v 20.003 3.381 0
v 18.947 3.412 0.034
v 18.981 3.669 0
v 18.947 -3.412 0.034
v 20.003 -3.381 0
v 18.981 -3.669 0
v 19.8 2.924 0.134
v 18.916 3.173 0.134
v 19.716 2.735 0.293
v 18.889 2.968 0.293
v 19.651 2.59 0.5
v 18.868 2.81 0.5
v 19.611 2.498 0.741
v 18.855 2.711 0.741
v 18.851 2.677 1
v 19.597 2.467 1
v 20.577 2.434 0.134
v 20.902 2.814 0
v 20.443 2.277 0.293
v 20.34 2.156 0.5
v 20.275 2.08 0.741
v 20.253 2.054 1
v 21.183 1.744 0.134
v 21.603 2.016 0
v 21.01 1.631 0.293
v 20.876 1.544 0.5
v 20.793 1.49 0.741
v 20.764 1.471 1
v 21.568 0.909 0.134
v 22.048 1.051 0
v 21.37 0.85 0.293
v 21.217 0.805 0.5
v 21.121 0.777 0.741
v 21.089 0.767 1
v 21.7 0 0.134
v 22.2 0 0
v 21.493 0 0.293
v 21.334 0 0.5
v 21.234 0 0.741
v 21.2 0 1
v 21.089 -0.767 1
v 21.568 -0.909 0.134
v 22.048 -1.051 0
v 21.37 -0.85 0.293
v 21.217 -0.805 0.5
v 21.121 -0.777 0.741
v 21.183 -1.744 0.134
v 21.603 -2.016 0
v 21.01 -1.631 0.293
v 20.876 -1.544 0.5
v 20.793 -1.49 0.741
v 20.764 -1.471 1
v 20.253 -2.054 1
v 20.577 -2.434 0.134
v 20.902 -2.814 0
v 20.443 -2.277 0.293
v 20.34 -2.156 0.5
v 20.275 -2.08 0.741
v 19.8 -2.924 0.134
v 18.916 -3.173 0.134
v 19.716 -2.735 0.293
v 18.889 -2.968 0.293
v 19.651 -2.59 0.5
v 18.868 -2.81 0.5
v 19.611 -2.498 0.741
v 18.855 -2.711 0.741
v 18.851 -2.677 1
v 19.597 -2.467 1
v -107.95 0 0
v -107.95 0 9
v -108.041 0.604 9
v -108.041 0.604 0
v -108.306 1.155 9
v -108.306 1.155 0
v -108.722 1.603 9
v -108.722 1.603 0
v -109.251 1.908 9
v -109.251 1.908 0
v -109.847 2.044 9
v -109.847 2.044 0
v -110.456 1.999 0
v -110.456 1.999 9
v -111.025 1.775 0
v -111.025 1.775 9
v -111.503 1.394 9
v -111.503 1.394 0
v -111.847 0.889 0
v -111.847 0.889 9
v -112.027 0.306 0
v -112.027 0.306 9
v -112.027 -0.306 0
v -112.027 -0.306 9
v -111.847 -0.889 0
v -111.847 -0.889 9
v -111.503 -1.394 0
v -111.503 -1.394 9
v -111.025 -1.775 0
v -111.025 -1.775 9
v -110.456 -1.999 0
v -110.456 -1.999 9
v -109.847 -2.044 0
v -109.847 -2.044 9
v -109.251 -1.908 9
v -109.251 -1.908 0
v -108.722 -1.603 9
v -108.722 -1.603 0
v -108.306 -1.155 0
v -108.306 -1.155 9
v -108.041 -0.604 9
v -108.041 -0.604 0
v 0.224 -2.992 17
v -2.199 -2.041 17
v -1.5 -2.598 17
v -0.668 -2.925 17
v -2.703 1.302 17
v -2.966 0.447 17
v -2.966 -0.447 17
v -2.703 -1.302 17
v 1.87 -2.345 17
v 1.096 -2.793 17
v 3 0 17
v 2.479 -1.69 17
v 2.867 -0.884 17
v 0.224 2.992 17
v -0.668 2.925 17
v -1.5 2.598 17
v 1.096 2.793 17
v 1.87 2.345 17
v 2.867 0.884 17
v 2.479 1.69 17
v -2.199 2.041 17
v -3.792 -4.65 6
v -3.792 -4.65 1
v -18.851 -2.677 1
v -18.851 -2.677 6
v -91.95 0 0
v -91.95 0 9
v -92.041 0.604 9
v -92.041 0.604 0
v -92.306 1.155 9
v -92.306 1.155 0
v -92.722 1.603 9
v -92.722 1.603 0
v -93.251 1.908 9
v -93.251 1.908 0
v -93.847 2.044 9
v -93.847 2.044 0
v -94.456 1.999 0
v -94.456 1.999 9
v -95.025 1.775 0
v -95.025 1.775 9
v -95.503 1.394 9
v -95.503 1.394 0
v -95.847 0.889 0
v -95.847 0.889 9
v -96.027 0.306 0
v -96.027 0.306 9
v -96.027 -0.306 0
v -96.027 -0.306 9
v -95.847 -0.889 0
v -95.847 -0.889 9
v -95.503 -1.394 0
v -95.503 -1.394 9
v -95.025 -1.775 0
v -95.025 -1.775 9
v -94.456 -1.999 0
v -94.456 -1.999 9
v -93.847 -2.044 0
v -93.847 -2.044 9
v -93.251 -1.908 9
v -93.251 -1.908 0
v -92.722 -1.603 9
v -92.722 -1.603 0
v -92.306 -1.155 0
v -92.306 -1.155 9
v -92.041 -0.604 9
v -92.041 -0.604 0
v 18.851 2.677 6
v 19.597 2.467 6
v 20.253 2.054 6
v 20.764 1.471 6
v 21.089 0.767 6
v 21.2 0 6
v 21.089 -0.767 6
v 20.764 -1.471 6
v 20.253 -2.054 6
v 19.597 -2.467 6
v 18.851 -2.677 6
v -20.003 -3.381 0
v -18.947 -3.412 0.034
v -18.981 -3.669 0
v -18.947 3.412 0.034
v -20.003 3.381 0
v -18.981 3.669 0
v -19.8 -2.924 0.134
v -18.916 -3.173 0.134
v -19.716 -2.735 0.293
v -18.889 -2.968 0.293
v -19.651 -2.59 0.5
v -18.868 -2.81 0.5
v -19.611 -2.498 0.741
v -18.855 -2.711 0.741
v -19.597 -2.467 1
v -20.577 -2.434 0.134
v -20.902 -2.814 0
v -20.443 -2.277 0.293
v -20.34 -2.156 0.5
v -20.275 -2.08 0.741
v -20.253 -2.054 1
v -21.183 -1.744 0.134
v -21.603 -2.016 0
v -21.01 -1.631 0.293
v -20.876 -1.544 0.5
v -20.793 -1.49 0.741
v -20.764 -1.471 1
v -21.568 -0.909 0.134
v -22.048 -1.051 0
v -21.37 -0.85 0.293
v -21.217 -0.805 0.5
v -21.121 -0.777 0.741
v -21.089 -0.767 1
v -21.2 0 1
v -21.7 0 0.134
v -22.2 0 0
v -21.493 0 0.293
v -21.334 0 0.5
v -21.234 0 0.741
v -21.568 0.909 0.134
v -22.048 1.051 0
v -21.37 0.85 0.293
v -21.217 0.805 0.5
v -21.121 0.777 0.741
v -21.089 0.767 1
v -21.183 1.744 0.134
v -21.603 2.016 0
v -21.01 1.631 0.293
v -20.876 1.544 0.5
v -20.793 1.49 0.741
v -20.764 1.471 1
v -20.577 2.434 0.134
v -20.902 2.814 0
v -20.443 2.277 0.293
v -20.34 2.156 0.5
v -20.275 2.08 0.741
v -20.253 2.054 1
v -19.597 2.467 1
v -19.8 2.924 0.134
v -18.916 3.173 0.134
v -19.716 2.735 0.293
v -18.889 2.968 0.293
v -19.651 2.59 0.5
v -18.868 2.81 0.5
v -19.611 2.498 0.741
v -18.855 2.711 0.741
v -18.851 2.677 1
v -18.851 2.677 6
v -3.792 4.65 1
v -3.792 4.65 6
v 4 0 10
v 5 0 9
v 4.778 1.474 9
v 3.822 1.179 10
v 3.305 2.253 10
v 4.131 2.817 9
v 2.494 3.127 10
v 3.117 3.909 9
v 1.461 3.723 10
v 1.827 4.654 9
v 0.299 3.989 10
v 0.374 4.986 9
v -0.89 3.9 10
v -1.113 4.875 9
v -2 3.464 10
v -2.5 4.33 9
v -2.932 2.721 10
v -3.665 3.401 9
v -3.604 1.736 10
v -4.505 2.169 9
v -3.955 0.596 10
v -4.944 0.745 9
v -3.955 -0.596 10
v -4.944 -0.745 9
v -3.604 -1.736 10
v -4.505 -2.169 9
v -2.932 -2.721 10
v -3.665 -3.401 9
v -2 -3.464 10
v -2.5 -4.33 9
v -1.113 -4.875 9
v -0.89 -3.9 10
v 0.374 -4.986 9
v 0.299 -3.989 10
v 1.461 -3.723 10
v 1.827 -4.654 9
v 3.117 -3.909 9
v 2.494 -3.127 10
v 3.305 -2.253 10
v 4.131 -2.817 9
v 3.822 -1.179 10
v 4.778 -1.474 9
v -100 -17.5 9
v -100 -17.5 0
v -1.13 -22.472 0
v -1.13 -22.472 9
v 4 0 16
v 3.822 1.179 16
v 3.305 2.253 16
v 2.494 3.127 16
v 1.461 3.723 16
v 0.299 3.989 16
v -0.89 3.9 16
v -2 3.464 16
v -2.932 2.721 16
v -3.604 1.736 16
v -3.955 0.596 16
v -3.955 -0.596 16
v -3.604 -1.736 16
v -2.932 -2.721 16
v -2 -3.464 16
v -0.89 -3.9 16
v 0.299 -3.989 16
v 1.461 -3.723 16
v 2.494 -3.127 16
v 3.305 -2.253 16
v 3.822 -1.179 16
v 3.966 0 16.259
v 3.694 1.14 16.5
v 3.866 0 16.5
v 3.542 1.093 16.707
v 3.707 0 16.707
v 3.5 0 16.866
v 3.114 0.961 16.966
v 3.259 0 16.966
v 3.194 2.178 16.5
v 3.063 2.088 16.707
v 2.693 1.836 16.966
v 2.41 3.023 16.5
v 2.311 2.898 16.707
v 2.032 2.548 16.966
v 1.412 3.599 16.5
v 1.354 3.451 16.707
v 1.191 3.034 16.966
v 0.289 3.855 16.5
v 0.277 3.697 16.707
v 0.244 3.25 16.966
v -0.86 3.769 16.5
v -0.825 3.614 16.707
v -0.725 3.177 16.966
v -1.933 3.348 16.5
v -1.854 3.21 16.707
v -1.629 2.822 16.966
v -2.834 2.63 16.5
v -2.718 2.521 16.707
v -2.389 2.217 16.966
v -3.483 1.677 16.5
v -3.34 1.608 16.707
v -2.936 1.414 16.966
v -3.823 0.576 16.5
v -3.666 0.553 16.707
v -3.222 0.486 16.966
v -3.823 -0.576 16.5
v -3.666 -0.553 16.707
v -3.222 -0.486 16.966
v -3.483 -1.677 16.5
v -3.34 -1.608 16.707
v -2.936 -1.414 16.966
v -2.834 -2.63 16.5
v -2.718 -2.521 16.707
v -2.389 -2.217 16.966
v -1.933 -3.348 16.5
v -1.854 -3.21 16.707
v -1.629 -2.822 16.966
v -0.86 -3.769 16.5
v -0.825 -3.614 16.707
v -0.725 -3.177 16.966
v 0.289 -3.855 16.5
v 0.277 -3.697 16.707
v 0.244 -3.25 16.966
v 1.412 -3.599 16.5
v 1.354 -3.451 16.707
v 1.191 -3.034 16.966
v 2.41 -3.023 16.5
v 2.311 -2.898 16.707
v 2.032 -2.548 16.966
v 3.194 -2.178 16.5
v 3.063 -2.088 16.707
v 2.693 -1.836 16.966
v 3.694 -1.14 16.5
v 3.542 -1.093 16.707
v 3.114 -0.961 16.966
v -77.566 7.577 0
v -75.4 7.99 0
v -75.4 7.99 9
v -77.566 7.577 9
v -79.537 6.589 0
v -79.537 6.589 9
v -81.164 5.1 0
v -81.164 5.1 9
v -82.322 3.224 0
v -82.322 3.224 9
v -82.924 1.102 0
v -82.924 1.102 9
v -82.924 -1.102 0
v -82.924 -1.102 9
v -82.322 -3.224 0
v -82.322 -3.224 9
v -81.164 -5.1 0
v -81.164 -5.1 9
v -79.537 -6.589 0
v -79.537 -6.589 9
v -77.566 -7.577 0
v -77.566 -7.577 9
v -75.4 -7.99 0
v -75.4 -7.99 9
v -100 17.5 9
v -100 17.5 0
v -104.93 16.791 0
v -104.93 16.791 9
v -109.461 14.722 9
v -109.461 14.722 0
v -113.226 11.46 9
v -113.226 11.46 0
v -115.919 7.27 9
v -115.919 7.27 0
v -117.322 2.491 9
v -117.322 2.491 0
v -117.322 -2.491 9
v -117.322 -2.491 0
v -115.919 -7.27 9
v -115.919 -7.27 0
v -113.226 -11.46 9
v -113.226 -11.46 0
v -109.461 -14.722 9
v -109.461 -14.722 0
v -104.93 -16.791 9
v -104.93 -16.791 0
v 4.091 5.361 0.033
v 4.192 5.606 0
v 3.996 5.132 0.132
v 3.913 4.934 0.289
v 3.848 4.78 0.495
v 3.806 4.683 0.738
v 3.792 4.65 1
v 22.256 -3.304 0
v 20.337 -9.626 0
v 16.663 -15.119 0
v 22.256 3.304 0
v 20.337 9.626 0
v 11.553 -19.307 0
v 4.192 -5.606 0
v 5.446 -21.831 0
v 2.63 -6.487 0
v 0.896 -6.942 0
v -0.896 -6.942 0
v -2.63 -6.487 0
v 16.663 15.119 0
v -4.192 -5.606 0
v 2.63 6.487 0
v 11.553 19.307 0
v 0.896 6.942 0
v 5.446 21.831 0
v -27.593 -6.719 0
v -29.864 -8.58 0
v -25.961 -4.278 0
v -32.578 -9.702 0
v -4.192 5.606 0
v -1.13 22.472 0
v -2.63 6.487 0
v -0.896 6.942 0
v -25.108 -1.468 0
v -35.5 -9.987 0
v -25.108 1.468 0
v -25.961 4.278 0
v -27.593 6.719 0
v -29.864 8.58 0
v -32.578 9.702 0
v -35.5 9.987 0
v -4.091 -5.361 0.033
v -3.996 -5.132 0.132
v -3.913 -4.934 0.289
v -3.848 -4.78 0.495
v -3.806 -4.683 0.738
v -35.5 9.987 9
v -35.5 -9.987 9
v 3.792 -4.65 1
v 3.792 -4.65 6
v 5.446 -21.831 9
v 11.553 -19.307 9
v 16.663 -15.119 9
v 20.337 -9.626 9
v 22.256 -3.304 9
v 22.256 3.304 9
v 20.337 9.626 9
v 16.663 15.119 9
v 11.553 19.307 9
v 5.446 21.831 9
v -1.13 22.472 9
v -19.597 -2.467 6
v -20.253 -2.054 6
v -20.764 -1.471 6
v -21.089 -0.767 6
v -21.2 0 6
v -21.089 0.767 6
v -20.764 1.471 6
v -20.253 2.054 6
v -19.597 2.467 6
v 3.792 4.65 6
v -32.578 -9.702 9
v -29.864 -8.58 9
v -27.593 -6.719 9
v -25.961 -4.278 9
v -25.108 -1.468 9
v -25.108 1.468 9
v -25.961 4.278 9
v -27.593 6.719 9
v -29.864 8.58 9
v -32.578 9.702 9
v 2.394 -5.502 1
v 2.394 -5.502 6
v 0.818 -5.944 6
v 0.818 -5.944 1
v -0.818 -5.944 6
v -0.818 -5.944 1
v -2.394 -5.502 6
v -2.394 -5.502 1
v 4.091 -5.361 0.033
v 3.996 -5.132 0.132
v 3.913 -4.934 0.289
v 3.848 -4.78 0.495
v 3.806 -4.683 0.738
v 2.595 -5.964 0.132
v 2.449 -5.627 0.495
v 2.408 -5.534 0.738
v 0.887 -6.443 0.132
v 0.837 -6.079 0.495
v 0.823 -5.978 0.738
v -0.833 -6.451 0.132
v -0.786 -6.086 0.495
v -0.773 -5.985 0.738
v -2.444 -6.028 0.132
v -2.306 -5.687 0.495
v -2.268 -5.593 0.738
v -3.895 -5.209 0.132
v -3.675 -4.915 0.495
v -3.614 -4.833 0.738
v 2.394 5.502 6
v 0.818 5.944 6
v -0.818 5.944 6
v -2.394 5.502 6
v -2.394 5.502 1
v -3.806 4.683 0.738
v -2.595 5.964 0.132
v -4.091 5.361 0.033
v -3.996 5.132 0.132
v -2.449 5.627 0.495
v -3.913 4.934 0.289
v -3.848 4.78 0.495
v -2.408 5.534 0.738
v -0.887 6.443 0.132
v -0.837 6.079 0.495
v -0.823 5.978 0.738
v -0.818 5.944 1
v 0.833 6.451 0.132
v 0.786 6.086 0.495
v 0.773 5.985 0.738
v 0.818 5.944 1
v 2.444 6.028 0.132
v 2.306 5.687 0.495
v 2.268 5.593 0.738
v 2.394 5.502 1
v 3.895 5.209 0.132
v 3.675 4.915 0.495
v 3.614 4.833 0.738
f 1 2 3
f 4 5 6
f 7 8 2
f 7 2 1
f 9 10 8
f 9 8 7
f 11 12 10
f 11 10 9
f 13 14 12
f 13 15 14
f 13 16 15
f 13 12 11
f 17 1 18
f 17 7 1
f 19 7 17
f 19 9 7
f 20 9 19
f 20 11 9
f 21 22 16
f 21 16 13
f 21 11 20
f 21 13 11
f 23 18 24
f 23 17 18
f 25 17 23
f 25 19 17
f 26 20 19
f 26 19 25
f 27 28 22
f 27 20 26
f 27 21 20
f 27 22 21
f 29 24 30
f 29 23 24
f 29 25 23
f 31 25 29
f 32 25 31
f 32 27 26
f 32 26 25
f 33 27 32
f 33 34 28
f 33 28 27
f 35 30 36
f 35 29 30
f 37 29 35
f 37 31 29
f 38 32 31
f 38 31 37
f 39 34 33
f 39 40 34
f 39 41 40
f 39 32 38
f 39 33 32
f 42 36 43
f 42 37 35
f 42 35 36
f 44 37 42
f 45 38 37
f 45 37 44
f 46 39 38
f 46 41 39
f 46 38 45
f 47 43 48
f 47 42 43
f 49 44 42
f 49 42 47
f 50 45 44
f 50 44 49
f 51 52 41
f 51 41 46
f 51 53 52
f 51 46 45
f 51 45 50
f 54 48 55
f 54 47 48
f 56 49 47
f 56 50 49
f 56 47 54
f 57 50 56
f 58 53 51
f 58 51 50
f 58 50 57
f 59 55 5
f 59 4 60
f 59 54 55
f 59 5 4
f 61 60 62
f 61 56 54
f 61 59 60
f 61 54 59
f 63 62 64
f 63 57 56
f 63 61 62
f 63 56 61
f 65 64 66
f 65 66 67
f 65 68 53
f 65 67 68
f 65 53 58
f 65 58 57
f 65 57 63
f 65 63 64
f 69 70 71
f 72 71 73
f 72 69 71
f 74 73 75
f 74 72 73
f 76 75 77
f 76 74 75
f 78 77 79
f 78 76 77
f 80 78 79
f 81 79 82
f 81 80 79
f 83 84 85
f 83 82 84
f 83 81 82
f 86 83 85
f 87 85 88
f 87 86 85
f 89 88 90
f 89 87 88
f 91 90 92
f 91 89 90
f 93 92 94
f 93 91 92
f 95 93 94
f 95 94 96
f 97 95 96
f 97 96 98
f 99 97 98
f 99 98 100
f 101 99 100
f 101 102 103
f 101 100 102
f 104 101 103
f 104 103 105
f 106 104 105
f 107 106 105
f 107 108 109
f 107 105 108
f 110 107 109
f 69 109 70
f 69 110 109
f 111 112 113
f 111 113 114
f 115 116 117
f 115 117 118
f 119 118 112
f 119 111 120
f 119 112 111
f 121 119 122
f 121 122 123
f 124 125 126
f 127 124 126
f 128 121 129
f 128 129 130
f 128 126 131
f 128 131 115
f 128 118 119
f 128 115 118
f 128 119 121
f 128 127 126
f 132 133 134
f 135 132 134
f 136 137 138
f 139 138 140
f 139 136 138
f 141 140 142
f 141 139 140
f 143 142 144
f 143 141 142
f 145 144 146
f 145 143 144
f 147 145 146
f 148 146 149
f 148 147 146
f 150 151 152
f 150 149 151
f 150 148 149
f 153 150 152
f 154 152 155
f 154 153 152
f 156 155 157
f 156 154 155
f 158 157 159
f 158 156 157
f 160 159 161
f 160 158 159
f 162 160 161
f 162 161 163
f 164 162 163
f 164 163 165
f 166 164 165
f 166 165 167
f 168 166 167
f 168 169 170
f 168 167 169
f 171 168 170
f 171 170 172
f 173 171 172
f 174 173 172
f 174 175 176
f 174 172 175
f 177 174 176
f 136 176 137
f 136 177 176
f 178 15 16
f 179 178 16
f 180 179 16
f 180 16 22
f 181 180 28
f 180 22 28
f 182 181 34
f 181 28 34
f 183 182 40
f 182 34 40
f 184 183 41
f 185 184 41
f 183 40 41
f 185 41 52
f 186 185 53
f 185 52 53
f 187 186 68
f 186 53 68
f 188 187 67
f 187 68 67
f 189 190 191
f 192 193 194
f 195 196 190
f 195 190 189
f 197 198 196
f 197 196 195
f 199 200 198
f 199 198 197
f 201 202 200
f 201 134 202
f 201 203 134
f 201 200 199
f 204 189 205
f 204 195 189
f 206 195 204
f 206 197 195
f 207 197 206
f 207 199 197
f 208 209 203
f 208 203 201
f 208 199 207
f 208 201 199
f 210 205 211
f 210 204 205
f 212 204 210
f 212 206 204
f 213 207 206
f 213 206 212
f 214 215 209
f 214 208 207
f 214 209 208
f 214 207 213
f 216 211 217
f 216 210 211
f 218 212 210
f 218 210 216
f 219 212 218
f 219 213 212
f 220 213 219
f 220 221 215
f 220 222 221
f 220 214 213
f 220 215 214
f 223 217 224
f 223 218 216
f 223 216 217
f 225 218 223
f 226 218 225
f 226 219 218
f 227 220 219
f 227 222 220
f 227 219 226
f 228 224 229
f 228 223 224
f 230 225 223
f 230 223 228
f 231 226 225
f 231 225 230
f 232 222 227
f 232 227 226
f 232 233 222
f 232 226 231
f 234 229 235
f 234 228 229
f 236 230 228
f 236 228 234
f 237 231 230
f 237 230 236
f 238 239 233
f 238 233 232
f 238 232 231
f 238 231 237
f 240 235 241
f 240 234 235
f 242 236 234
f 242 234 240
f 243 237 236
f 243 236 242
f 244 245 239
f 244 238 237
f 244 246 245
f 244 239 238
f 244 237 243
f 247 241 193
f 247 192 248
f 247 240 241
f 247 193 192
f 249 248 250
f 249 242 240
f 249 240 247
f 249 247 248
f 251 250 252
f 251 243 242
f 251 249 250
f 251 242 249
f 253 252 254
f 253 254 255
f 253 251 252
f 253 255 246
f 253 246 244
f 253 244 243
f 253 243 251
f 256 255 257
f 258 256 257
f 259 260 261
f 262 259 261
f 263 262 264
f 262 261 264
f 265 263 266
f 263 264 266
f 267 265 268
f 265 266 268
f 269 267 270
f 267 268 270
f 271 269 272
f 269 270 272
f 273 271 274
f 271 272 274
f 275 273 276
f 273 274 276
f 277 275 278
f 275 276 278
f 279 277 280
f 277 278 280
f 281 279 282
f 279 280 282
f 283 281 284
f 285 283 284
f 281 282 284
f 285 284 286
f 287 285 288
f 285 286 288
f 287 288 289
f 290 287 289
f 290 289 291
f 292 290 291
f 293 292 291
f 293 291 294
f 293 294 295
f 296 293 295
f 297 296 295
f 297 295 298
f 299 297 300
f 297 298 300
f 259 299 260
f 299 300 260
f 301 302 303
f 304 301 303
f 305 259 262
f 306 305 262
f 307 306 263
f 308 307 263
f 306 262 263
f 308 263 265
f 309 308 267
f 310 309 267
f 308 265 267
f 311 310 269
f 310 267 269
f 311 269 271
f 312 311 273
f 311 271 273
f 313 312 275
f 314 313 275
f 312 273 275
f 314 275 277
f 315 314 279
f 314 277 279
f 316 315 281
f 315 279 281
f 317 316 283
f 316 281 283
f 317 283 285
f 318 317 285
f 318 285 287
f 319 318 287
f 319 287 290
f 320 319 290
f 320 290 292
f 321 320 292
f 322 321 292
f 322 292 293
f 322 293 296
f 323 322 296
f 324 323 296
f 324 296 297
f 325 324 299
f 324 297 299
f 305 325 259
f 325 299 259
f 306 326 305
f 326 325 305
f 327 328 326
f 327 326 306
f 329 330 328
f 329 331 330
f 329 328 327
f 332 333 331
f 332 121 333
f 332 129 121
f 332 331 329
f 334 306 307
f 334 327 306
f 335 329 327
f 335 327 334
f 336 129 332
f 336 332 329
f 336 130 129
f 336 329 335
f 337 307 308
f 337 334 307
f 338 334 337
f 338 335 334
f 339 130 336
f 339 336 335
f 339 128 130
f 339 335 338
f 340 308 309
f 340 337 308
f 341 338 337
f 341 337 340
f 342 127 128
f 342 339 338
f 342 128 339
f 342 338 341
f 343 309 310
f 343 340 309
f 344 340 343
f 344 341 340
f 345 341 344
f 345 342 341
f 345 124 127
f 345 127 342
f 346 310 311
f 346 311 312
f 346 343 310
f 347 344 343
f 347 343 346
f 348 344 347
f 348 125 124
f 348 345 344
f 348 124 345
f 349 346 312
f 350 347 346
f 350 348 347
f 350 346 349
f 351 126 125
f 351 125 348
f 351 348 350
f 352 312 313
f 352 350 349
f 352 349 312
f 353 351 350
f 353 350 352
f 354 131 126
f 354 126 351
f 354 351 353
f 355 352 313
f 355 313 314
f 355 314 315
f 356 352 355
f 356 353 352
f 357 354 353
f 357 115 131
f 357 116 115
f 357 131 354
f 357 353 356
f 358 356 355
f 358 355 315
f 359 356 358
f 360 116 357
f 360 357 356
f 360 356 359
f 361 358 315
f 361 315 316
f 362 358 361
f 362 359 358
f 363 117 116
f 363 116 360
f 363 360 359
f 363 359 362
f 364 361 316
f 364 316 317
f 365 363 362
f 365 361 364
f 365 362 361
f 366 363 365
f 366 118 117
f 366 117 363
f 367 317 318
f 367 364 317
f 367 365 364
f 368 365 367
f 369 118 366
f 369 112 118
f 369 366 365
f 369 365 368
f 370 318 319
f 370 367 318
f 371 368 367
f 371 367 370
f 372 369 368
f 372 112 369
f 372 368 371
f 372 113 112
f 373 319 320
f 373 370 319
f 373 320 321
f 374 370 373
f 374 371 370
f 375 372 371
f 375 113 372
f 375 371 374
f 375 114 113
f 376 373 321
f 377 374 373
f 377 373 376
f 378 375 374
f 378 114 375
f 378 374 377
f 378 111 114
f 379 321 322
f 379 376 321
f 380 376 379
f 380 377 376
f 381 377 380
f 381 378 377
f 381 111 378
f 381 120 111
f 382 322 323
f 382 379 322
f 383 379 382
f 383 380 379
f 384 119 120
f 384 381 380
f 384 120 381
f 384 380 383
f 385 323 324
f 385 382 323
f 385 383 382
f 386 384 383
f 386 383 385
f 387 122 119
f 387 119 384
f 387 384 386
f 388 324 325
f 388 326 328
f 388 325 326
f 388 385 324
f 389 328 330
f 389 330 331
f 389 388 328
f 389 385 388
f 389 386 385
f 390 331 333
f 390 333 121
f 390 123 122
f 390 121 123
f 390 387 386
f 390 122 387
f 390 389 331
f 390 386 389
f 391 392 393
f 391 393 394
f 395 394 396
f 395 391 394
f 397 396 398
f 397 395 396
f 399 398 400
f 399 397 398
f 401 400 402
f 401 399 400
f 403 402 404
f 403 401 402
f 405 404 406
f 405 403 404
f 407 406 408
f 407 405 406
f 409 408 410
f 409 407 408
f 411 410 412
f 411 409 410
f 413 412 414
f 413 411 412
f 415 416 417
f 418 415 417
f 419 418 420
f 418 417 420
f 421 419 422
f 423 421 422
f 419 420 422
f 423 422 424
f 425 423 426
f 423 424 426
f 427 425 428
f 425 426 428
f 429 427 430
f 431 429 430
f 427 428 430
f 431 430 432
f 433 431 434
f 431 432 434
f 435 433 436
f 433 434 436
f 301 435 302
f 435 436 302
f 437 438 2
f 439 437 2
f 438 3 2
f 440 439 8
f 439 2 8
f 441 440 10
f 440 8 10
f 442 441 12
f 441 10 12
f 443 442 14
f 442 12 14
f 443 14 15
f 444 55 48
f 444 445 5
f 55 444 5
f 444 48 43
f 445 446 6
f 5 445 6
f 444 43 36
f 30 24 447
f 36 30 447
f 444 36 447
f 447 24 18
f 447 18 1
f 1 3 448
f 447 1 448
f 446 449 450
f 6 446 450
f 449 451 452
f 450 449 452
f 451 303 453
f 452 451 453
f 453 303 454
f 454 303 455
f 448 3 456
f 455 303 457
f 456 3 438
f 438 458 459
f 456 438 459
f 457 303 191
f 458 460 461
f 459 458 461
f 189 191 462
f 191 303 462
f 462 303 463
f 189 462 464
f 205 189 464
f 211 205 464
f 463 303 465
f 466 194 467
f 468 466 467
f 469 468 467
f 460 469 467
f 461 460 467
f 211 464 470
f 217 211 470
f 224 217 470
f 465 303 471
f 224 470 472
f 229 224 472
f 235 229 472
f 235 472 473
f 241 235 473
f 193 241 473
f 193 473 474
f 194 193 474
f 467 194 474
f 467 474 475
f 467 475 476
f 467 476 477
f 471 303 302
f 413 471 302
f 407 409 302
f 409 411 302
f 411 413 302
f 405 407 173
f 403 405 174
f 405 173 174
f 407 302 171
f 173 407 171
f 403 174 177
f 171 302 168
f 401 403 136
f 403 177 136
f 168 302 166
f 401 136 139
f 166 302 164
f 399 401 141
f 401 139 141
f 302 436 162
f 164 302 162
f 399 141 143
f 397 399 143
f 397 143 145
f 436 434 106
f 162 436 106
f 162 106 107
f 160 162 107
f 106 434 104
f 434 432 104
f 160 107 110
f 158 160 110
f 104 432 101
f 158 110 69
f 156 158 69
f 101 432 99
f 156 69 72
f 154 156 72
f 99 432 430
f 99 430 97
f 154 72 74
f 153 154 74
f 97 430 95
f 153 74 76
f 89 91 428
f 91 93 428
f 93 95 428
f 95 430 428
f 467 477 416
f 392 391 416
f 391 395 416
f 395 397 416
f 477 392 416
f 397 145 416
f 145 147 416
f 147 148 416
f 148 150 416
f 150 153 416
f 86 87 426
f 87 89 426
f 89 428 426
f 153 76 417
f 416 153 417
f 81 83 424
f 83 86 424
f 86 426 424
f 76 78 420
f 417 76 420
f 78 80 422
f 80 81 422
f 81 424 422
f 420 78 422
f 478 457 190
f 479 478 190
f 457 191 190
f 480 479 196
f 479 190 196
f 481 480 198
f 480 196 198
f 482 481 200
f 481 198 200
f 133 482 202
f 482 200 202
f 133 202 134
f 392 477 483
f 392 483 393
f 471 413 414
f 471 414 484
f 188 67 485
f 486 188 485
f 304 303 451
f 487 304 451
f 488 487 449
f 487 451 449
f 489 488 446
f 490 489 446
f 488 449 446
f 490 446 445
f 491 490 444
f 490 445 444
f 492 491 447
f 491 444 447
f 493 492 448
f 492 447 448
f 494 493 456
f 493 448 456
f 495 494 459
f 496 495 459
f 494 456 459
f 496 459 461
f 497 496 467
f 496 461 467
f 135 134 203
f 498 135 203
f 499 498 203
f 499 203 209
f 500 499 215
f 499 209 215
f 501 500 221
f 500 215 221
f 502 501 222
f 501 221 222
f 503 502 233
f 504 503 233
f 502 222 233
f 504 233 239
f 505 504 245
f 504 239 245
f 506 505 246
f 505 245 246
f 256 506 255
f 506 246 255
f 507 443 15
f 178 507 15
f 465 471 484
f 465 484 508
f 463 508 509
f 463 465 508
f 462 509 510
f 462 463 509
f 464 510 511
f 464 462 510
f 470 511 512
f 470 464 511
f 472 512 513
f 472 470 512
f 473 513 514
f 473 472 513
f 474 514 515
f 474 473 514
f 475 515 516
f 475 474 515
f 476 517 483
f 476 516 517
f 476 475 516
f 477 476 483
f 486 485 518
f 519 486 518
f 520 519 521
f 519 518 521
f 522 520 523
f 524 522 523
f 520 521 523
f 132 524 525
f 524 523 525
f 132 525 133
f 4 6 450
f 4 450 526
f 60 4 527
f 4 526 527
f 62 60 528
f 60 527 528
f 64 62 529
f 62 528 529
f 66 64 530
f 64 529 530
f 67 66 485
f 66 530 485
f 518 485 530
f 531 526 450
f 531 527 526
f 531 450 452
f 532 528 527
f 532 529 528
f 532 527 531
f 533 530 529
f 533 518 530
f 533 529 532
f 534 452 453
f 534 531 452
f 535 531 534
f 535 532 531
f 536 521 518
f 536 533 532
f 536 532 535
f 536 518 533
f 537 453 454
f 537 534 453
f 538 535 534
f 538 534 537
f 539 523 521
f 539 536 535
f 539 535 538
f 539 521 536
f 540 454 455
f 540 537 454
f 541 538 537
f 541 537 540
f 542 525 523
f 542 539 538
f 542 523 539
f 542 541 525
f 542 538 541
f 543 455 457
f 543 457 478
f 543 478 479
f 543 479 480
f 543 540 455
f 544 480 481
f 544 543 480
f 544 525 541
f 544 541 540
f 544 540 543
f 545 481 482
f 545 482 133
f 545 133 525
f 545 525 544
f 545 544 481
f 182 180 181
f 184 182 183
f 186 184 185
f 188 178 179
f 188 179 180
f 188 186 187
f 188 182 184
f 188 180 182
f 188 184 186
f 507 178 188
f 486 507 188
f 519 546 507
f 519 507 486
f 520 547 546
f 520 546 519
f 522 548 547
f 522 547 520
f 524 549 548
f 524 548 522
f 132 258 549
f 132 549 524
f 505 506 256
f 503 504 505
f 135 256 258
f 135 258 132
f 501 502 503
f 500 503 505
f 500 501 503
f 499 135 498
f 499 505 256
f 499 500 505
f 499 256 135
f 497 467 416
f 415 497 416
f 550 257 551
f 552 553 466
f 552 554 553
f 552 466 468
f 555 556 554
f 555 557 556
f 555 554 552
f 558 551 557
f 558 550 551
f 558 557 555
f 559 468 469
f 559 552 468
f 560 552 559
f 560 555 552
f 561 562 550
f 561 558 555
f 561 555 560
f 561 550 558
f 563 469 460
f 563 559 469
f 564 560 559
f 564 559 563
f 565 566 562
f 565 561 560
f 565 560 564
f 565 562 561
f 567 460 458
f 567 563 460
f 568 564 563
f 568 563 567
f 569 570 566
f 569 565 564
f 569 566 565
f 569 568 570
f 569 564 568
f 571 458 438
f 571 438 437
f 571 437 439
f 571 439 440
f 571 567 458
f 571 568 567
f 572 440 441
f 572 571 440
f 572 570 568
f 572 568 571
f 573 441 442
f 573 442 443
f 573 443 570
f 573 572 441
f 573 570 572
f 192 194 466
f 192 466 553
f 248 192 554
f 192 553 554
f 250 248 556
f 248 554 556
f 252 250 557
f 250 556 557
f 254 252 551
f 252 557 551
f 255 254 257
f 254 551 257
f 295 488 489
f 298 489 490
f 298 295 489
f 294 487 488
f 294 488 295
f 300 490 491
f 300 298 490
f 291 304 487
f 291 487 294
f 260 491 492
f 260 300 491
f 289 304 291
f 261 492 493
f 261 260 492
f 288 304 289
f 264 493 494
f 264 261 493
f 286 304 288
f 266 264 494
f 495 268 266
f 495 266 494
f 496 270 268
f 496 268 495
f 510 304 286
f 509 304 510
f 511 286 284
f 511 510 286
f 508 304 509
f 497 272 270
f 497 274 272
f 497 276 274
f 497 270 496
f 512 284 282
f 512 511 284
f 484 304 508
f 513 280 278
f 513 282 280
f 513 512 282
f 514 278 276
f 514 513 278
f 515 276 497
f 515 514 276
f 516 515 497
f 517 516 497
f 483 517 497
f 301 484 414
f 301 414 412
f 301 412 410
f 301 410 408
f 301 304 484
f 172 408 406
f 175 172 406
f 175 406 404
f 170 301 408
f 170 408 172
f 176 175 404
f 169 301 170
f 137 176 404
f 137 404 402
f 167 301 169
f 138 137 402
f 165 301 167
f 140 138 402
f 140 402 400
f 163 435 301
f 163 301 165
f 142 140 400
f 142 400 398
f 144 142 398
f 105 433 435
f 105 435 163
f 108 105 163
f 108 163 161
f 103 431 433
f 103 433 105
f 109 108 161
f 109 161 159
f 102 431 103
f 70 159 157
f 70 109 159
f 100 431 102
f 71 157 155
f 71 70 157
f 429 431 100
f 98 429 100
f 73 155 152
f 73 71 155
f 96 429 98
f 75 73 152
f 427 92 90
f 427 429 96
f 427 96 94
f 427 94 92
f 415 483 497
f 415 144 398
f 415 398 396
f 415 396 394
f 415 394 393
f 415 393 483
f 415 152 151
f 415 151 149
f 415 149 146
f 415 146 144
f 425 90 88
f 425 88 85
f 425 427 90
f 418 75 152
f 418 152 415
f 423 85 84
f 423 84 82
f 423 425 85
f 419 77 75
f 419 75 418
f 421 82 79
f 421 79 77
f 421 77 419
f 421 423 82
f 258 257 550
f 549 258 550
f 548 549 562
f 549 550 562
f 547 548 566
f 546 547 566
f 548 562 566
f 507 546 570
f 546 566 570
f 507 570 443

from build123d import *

# Parameters (mm, degrees)
BOSS_EXTRUDE1_DEPTH = 9
BOSS_EXTRUDE2_START = 9
SKETCH3_R           = 4
BOSS_EXTRUDE2_DEPTH = 8
FILLET1_R           = 1
CHAMFER2_SIZE       = 1
CUT_EXTRUDE1_DEPTH  = 6
FILLET3_R           = 1
SKETCH6_R           = 2.05
CUT_EXTRUDE2_DEPTH  = 10


with BuildPart() as part:
    # Sketch2 → Boss-Extrude1 (new body)
    with BuildSketch(Plane(origin=(0, 0, 0), x_dir=(0, 1, 0), z_dir=(0, 0, 1))):
        with BuildLine():
            Line((22.471608109, 1.129968581), (17.5, 100))
            ThreePointArc((17.5, 100), (0, 117.5), (-17.5, 100))
            Line((-17.5, 100), (-22.471608109, 1.129968581))
            ThreePointArc((-22.471608109, 1.129968581), (0, -22.5), (22.471608109, 1.129968581))
        make_face()
    extrude(amount=BOSS_EXTRUDE1_DEPTH)

    # Sketch3 → Boss-Extrude2 (add)
    with BuildSketch(Plane(origin=(0, 0, 0), x_dir=(0, 1, 0), z_dir=(0, 0, 1)).offset(BOSS_EXTRUDE2_START)):
        with Locations(Location((0, 0, 0), (0, 0, 270))):
            Circle(SKETCH3_R)
    extrude(amount=BOSS_EXTRUDE2_DEPTH)

    # Fillet1
    fillet1_edges = [part.edges().sort_by_distance(p)[0] for p in [
        (-4, 0, 17),
    ]]
    fillet(fillet1_edges, radius=FILLET1_R)

    # Chamfer2
    chamfer2_edges = [part.edges().sort_by_distance(p)[0] for p in [
        (-4, 0, 9),
    ]]
    chamfer(chamfer2_edges, length=CHAMFER2_SIZE)

    # Sketch5 → Cut-Extrude1 (cut)
    with BuildSketch(Plane(origin=(0, 0, 0), x_dir=(0, 1, 0), z_dir=(0, 0, 1))):
        with BuildLine():
            Line((-2.677123133, -18.850730282), (-4.65, -3.791767398))
            ThreePointArc((-4.65, -3.791767398), (-6, 0), (-4.65, 3.791767398))
            Line((-4.65, 3.791767398), (-2.677123133, 18.850730282))
            ThreePointArc((-2.677123133, 18.850730282), (0, 21.2), (2.677123133, 18.850730282))
            Line((2.677123133, 18.850730282), (4.65, 3.791767398))
            ThreePointArc((4.65, 3.791767398), (6, 0), (4.65, -3.791767398))
            Line((4.65, -3.791767398), (2.677123133, -18.850730282))
            ThreePointArc((2.677123133, -18.850730282), (0, -21.2), (-2.677123133, -18.850730282))
        make_face()
    extrude(amount=CUT_EXTRUDE1_DEPTH, mode=Mode.SUBTRACT)

    # Fillet3
    fillet3_edges = [part.edges().sort_by_distance(p)[0] for p in [
        (-21.2, 0, 0),
        (0, -6, 0),
        (21.2, 0, 0),
        (0, 6, 0),
        (-11.32124884, 3.663561567, 0),
        (11.32124884, 3.663561567, 0),
        (11.32124884, -3.663561567, 0),
        (-11.32124884, -3.663561567, 0),
    ]]
    fillet(fillet3_edges, radius=FILLET3_R)

    # Sketch6 → Cut-Extrude2 (cut)
    with BuildSketch(Plane(origin=(0, 0, 0), x_dir=(0, 1, 0), z_dir=(0, 0, 1))):
        with Locations(Location((0, 110, 0), (0, 0, 270))):
            Circle(SKETCH6_R)
        with Locations(Location((0, 94, 0), (0, 0, 270))):
            Circle(SKETCH6_R)
        with BuildLine():
            Line((-7.989993742, 75.4), (-9.987492178, 35.5))
            ThreePointArc((-9.987492178, 35.5), (0, 25), (9.987492178, 35.5))
            Line((9.987492178, 35.5), (7.989993742, 75.4))
            ThreePointArc((7.989993742, 75.4), (0, 83), (-7.989993742, 75.4))
        make_face()
    extrude(amount=CUT_EXTRUDE2_DEPTH, mode=Mode.SUBTRACT)


solid = part.part
